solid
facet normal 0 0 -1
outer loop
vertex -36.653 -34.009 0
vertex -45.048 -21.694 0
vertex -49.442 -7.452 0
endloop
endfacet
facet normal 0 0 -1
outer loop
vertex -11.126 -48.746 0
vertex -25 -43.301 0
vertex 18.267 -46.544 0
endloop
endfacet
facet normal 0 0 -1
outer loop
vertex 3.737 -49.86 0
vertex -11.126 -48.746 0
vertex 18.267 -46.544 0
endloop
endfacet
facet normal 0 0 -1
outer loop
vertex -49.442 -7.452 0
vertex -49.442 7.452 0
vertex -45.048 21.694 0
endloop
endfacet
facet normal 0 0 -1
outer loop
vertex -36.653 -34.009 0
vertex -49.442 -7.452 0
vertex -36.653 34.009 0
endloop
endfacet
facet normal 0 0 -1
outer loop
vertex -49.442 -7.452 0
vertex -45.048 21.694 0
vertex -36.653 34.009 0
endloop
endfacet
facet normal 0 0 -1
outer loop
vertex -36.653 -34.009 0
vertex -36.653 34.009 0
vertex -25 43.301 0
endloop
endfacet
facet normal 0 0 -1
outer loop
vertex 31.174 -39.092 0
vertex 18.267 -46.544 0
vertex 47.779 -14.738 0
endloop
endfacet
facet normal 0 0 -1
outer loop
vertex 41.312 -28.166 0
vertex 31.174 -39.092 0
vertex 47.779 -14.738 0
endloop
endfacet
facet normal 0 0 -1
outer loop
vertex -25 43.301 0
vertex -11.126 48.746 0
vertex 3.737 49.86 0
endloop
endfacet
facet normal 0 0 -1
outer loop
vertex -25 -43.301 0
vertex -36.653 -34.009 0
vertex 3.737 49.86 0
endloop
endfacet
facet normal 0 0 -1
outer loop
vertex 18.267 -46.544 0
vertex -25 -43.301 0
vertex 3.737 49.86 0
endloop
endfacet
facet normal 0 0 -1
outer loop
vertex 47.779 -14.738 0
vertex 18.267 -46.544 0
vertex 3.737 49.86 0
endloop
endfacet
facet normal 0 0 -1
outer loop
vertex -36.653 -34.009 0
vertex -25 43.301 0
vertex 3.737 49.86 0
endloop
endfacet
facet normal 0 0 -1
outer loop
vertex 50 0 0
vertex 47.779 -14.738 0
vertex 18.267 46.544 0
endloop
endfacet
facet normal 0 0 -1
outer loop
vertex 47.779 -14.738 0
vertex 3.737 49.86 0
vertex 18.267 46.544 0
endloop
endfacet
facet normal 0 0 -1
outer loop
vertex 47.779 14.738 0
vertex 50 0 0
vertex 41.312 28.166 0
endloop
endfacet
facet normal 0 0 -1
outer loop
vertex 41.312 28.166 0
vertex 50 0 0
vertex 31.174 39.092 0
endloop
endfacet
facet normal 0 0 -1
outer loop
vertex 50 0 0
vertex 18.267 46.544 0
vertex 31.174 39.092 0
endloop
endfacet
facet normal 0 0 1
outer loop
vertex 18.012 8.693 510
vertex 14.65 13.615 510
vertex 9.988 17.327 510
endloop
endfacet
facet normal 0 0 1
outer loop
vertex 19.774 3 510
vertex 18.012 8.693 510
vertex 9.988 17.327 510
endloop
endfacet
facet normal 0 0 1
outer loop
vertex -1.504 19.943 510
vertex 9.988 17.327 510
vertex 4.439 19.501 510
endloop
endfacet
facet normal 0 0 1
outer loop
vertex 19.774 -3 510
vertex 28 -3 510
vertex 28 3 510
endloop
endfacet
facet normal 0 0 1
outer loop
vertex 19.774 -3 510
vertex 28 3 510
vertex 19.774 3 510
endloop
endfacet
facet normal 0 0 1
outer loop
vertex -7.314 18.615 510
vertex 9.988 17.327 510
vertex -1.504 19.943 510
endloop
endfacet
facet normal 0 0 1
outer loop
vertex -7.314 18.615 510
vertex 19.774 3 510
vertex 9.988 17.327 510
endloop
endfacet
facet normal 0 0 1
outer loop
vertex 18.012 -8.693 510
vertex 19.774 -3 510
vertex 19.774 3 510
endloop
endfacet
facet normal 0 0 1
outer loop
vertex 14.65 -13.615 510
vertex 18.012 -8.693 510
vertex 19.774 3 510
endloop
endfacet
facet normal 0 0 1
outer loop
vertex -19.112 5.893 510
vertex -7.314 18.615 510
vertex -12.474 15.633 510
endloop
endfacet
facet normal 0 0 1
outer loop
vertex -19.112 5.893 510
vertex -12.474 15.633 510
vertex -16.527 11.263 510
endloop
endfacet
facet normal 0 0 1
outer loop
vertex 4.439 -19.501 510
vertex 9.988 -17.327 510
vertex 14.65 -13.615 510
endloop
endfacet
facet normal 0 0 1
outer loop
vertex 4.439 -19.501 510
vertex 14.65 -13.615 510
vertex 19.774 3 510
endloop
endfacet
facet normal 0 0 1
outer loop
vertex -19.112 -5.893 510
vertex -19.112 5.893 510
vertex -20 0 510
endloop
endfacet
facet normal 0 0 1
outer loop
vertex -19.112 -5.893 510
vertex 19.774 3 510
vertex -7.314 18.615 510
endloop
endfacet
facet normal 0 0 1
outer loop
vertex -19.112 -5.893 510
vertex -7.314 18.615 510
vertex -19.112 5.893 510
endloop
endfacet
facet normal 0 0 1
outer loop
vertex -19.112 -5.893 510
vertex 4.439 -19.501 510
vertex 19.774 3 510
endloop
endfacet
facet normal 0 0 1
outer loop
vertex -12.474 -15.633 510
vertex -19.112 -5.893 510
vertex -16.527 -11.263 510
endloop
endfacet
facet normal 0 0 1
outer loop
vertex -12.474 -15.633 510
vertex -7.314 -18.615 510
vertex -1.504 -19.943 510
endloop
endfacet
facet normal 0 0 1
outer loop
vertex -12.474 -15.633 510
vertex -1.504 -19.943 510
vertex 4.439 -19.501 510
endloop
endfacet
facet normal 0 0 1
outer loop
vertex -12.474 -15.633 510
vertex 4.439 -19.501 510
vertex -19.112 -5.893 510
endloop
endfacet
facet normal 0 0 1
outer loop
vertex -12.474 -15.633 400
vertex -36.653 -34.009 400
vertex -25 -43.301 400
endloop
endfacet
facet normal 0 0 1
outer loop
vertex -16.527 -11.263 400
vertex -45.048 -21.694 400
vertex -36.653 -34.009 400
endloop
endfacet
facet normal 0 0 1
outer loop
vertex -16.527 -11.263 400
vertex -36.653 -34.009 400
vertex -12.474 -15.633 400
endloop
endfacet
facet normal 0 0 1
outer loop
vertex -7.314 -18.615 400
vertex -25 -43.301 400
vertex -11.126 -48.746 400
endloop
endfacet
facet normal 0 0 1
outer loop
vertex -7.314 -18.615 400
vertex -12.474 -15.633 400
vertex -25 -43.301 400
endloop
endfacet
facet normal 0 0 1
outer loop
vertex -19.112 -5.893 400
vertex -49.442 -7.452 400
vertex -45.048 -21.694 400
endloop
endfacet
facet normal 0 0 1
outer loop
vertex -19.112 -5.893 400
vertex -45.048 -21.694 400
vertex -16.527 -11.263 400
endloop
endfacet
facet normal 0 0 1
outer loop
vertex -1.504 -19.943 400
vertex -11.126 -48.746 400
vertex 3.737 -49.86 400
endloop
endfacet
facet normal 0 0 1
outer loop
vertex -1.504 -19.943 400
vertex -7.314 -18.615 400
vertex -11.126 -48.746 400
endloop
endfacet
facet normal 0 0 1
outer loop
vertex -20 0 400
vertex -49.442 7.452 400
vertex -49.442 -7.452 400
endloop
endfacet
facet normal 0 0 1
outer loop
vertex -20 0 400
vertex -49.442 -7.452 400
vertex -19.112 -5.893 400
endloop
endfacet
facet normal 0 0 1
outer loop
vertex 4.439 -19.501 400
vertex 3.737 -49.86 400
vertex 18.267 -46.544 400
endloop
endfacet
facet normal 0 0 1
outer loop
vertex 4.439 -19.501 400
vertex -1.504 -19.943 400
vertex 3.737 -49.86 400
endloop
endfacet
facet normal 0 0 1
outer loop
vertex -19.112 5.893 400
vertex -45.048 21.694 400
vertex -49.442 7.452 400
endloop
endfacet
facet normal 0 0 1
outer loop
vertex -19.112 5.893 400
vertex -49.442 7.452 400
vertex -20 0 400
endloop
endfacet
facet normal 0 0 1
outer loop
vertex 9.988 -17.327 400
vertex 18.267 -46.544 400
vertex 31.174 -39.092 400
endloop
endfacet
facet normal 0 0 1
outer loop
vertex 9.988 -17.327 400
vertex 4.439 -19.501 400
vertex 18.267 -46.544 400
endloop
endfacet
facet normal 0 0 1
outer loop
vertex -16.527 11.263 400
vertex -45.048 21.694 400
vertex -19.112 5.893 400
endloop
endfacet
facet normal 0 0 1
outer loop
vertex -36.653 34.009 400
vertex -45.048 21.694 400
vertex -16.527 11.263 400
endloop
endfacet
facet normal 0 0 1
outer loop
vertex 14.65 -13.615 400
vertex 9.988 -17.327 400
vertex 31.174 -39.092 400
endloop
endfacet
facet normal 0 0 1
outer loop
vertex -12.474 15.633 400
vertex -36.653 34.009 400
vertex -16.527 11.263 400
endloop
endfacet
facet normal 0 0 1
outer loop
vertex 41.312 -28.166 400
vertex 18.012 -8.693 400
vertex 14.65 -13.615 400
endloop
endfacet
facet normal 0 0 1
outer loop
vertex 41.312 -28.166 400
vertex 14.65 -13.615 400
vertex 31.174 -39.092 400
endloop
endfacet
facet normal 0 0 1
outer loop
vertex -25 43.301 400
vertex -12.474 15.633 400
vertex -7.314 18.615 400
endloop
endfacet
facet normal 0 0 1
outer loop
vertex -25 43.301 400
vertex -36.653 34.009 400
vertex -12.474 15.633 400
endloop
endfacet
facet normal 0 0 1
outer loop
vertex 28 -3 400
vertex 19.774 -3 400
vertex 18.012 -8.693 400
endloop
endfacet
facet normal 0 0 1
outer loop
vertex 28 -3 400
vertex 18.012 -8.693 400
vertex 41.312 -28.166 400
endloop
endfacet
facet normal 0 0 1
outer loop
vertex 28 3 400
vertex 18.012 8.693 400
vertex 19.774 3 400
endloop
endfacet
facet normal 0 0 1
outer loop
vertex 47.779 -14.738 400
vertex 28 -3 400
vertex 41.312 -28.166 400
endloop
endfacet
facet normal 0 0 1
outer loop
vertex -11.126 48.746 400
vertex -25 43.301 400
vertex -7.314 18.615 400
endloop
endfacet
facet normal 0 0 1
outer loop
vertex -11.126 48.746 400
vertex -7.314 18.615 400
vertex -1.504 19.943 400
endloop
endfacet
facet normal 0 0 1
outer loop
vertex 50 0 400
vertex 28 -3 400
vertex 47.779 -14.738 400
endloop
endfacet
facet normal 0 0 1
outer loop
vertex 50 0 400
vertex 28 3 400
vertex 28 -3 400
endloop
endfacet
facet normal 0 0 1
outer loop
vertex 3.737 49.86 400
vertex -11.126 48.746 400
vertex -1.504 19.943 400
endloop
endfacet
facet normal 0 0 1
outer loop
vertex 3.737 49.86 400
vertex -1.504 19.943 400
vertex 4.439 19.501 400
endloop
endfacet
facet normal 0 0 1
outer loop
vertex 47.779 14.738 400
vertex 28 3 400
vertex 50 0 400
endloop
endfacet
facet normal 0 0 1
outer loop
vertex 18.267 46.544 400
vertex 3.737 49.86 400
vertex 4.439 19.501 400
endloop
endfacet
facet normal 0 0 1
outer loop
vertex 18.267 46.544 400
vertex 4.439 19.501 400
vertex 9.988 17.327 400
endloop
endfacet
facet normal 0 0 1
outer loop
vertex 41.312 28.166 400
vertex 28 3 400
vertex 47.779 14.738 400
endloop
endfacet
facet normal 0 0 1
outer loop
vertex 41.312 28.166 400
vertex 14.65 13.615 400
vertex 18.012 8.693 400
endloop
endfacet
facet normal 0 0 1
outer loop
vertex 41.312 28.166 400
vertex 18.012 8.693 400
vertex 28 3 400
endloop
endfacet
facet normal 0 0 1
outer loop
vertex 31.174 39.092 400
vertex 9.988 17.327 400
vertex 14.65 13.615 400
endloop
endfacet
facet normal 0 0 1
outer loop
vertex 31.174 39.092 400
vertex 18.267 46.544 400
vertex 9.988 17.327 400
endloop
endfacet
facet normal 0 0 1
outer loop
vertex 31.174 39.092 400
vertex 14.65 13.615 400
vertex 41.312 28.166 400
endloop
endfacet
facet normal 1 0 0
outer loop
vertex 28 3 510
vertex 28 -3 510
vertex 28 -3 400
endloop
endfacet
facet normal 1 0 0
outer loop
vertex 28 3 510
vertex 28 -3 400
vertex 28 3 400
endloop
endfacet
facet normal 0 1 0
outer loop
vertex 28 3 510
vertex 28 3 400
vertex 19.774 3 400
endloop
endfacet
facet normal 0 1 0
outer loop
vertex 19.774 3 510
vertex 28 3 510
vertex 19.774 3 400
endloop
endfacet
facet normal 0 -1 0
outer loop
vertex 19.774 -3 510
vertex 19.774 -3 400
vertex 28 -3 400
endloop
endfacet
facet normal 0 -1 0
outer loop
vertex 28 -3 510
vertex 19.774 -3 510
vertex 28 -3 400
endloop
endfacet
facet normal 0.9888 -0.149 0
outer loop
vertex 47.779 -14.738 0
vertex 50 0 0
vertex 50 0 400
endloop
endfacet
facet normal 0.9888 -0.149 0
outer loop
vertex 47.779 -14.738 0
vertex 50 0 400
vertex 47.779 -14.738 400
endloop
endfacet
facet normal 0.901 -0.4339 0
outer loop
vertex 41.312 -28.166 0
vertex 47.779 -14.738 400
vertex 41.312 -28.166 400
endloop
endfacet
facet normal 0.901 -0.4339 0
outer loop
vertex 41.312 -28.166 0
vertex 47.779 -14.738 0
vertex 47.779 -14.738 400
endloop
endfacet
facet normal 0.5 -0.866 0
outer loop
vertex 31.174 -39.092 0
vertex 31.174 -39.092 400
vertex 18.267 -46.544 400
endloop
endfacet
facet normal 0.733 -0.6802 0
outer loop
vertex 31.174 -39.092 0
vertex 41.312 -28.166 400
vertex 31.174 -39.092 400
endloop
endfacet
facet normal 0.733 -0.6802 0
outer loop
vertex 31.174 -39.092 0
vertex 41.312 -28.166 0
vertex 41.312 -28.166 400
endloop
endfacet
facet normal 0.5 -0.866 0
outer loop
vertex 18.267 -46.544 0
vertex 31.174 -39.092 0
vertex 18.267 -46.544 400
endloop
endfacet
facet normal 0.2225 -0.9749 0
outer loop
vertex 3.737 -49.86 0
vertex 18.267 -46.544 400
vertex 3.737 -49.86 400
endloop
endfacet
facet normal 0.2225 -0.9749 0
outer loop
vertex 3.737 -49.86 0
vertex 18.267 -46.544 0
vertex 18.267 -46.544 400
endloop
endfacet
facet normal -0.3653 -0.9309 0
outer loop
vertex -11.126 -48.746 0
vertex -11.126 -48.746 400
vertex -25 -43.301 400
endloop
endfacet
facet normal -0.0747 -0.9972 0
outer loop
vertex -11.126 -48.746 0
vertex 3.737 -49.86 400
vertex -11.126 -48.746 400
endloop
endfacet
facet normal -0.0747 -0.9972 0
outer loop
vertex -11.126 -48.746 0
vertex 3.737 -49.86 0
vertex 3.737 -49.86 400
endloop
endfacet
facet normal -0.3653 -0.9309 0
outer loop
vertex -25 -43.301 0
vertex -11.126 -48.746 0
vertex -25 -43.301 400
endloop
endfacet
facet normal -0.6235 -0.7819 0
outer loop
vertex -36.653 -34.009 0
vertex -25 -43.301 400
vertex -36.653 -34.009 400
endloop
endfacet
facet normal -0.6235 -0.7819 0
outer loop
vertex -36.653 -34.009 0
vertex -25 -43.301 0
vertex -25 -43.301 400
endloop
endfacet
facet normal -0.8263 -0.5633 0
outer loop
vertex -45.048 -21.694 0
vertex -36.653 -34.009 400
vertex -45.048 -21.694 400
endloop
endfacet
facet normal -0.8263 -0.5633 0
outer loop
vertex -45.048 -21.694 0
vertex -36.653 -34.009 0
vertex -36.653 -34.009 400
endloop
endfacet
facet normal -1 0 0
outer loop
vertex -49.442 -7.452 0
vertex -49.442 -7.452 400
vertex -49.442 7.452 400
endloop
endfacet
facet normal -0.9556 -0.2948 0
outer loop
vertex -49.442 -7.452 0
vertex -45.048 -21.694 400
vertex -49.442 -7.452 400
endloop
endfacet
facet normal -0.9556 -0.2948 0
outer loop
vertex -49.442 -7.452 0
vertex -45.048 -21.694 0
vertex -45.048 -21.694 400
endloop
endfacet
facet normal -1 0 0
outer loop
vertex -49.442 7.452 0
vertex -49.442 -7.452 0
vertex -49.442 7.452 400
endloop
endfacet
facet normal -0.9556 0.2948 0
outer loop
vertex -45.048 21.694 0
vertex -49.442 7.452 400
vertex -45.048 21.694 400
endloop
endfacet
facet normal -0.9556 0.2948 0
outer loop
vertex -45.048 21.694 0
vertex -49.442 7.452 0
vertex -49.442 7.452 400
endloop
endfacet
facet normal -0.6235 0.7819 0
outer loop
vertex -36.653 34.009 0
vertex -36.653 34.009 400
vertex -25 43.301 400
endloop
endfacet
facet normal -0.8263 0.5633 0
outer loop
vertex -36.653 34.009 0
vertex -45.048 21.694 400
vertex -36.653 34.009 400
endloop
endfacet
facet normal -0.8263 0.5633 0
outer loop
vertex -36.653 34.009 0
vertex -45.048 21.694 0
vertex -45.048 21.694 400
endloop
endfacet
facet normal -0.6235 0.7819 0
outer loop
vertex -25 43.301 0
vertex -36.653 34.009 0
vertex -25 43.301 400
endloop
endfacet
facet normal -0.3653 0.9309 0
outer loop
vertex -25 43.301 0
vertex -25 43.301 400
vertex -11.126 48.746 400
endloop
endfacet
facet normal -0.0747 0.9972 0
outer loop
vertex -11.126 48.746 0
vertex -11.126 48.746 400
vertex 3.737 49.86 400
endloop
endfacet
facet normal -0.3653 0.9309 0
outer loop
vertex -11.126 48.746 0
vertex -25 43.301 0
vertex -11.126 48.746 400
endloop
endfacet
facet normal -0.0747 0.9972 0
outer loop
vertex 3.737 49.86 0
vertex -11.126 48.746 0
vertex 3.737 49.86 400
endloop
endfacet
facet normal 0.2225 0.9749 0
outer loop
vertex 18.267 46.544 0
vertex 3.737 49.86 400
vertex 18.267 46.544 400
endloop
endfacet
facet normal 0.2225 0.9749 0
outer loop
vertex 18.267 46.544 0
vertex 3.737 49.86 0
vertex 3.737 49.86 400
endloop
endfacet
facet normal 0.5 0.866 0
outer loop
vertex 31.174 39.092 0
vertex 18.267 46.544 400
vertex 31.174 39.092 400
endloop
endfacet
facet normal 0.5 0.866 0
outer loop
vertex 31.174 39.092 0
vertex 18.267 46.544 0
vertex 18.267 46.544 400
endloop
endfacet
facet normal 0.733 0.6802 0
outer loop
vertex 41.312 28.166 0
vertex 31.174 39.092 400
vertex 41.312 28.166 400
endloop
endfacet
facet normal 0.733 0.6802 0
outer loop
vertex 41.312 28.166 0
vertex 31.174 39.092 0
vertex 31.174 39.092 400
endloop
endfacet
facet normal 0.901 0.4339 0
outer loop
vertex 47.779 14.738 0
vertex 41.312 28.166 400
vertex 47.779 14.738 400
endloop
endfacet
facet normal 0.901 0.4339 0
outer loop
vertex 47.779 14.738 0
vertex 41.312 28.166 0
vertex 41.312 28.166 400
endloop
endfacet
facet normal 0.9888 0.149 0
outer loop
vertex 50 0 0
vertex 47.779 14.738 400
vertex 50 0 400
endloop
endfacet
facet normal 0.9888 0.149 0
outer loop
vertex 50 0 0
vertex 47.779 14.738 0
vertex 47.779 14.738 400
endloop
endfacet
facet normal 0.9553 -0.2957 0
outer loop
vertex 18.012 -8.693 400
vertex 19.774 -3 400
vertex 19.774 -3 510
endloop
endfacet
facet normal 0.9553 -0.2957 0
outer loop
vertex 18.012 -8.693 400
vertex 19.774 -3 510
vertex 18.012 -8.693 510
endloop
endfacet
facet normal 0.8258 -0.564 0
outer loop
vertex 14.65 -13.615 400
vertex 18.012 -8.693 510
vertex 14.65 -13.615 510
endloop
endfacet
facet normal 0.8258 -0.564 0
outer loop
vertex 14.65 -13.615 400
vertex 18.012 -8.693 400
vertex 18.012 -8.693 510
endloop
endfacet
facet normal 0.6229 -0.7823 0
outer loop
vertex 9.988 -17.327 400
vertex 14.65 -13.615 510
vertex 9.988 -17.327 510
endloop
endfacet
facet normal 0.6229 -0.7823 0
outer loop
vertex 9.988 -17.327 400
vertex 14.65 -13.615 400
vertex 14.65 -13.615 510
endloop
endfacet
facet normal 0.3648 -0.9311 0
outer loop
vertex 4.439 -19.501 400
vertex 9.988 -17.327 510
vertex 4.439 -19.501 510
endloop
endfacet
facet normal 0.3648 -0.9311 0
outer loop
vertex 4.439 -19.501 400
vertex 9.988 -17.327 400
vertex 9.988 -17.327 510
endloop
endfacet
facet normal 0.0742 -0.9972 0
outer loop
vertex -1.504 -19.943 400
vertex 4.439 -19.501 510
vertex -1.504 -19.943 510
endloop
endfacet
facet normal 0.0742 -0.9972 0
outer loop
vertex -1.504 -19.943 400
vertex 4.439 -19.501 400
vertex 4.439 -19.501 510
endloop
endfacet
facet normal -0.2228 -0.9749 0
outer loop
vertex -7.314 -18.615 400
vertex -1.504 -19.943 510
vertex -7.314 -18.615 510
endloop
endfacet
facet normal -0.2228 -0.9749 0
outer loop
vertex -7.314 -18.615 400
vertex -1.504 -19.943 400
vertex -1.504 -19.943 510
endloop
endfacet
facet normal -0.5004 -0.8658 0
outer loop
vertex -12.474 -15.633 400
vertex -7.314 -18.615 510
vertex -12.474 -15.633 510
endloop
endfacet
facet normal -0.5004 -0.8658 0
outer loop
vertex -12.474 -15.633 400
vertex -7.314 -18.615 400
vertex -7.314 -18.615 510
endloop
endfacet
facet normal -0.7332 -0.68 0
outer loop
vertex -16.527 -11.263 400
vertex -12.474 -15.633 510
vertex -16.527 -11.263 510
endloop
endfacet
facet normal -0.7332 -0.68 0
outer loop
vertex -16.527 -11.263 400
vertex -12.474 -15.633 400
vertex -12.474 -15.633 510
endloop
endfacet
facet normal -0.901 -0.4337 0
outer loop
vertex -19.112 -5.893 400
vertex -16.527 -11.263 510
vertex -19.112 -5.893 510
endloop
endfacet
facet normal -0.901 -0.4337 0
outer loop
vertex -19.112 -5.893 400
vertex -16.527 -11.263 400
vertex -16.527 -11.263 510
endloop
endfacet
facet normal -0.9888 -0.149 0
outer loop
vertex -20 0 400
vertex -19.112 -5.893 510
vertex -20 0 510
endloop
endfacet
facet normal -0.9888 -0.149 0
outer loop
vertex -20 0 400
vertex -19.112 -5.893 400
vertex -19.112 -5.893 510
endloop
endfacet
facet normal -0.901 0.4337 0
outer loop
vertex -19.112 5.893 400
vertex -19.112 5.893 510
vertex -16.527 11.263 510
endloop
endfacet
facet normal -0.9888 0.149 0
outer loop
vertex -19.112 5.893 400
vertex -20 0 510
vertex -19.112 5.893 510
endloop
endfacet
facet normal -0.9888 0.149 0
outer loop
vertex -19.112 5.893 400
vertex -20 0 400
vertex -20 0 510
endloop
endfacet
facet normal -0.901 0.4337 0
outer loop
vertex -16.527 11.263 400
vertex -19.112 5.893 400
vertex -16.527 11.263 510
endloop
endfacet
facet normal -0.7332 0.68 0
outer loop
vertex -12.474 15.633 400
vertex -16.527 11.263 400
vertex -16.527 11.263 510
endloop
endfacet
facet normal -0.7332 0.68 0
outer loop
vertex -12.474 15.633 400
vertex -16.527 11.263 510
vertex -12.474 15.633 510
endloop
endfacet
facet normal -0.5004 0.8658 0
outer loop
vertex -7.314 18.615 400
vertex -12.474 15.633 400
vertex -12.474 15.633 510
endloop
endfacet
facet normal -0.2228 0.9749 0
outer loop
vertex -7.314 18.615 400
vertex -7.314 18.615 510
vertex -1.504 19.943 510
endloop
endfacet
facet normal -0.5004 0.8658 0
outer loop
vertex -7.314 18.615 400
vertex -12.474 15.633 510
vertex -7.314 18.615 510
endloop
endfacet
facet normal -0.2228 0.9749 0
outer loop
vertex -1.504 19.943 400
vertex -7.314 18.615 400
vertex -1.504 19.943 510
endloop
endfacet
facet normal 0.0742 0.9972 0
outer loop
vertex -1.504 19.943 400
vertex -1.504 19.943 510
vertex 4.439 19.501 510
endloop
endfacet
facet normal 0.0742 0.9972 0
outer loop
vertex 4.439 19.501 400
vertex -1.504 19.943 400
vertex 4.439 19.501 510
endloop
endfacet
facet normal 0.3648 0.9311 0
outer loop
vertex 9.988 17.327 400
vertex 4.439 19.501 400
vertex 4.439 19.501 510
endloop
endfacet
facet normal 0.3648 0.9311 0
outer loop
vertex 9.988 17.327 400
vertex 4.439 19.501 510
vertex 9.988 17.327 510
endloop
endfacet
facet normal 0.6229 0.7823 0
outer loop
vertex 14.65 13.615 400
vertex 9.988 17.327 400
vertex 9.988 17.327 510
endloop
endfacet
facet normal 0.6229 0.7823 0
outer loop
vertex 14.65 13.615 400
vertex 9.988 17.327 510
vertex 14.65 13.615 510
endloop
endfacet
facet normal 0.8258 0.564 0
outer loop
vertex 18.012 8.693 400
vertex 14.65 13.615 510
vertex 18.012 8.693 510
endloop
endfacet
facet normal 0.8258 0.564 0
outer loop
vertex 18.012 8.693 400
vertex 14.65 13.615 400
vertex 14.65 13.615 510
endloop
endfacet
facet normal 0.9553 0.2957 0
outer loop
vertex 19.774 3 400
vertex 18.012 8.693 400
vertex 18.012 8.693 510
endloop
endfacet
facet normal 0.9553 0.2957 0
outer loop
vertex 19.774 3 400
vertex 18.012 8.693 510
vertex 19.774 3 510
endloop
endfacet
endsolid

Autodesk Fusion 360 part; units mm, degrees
sketch "Sketch1" plane through (0, 0, 0) normal (0, 0, 1) x (1, 0, 0)
  circle A0 centre (0, 0) radius 50
extrude "Extrude1" add sketch "Sketch1" along normal blind 400
sketch "Sketch2" plane through (0, 0, 400) normal (0, 0, 1) x (-1, 0, 0)
  circle A0 centre (0, 0) radius 50
  line L0 (-28, -3) -> (-19.7737, -3)
  line L1 (-19.7737, 3) -> (-28, 3)
  line L2 (-28, 3) -> (-28, -3)
  arc A1 (-19.7737, -3) -> (-19.7737, 3) centre (0, 0) ccw
extrude "Extrude2" add sketch "Sketch2" along normal blind 110 contours L0 L1 L2 A1
